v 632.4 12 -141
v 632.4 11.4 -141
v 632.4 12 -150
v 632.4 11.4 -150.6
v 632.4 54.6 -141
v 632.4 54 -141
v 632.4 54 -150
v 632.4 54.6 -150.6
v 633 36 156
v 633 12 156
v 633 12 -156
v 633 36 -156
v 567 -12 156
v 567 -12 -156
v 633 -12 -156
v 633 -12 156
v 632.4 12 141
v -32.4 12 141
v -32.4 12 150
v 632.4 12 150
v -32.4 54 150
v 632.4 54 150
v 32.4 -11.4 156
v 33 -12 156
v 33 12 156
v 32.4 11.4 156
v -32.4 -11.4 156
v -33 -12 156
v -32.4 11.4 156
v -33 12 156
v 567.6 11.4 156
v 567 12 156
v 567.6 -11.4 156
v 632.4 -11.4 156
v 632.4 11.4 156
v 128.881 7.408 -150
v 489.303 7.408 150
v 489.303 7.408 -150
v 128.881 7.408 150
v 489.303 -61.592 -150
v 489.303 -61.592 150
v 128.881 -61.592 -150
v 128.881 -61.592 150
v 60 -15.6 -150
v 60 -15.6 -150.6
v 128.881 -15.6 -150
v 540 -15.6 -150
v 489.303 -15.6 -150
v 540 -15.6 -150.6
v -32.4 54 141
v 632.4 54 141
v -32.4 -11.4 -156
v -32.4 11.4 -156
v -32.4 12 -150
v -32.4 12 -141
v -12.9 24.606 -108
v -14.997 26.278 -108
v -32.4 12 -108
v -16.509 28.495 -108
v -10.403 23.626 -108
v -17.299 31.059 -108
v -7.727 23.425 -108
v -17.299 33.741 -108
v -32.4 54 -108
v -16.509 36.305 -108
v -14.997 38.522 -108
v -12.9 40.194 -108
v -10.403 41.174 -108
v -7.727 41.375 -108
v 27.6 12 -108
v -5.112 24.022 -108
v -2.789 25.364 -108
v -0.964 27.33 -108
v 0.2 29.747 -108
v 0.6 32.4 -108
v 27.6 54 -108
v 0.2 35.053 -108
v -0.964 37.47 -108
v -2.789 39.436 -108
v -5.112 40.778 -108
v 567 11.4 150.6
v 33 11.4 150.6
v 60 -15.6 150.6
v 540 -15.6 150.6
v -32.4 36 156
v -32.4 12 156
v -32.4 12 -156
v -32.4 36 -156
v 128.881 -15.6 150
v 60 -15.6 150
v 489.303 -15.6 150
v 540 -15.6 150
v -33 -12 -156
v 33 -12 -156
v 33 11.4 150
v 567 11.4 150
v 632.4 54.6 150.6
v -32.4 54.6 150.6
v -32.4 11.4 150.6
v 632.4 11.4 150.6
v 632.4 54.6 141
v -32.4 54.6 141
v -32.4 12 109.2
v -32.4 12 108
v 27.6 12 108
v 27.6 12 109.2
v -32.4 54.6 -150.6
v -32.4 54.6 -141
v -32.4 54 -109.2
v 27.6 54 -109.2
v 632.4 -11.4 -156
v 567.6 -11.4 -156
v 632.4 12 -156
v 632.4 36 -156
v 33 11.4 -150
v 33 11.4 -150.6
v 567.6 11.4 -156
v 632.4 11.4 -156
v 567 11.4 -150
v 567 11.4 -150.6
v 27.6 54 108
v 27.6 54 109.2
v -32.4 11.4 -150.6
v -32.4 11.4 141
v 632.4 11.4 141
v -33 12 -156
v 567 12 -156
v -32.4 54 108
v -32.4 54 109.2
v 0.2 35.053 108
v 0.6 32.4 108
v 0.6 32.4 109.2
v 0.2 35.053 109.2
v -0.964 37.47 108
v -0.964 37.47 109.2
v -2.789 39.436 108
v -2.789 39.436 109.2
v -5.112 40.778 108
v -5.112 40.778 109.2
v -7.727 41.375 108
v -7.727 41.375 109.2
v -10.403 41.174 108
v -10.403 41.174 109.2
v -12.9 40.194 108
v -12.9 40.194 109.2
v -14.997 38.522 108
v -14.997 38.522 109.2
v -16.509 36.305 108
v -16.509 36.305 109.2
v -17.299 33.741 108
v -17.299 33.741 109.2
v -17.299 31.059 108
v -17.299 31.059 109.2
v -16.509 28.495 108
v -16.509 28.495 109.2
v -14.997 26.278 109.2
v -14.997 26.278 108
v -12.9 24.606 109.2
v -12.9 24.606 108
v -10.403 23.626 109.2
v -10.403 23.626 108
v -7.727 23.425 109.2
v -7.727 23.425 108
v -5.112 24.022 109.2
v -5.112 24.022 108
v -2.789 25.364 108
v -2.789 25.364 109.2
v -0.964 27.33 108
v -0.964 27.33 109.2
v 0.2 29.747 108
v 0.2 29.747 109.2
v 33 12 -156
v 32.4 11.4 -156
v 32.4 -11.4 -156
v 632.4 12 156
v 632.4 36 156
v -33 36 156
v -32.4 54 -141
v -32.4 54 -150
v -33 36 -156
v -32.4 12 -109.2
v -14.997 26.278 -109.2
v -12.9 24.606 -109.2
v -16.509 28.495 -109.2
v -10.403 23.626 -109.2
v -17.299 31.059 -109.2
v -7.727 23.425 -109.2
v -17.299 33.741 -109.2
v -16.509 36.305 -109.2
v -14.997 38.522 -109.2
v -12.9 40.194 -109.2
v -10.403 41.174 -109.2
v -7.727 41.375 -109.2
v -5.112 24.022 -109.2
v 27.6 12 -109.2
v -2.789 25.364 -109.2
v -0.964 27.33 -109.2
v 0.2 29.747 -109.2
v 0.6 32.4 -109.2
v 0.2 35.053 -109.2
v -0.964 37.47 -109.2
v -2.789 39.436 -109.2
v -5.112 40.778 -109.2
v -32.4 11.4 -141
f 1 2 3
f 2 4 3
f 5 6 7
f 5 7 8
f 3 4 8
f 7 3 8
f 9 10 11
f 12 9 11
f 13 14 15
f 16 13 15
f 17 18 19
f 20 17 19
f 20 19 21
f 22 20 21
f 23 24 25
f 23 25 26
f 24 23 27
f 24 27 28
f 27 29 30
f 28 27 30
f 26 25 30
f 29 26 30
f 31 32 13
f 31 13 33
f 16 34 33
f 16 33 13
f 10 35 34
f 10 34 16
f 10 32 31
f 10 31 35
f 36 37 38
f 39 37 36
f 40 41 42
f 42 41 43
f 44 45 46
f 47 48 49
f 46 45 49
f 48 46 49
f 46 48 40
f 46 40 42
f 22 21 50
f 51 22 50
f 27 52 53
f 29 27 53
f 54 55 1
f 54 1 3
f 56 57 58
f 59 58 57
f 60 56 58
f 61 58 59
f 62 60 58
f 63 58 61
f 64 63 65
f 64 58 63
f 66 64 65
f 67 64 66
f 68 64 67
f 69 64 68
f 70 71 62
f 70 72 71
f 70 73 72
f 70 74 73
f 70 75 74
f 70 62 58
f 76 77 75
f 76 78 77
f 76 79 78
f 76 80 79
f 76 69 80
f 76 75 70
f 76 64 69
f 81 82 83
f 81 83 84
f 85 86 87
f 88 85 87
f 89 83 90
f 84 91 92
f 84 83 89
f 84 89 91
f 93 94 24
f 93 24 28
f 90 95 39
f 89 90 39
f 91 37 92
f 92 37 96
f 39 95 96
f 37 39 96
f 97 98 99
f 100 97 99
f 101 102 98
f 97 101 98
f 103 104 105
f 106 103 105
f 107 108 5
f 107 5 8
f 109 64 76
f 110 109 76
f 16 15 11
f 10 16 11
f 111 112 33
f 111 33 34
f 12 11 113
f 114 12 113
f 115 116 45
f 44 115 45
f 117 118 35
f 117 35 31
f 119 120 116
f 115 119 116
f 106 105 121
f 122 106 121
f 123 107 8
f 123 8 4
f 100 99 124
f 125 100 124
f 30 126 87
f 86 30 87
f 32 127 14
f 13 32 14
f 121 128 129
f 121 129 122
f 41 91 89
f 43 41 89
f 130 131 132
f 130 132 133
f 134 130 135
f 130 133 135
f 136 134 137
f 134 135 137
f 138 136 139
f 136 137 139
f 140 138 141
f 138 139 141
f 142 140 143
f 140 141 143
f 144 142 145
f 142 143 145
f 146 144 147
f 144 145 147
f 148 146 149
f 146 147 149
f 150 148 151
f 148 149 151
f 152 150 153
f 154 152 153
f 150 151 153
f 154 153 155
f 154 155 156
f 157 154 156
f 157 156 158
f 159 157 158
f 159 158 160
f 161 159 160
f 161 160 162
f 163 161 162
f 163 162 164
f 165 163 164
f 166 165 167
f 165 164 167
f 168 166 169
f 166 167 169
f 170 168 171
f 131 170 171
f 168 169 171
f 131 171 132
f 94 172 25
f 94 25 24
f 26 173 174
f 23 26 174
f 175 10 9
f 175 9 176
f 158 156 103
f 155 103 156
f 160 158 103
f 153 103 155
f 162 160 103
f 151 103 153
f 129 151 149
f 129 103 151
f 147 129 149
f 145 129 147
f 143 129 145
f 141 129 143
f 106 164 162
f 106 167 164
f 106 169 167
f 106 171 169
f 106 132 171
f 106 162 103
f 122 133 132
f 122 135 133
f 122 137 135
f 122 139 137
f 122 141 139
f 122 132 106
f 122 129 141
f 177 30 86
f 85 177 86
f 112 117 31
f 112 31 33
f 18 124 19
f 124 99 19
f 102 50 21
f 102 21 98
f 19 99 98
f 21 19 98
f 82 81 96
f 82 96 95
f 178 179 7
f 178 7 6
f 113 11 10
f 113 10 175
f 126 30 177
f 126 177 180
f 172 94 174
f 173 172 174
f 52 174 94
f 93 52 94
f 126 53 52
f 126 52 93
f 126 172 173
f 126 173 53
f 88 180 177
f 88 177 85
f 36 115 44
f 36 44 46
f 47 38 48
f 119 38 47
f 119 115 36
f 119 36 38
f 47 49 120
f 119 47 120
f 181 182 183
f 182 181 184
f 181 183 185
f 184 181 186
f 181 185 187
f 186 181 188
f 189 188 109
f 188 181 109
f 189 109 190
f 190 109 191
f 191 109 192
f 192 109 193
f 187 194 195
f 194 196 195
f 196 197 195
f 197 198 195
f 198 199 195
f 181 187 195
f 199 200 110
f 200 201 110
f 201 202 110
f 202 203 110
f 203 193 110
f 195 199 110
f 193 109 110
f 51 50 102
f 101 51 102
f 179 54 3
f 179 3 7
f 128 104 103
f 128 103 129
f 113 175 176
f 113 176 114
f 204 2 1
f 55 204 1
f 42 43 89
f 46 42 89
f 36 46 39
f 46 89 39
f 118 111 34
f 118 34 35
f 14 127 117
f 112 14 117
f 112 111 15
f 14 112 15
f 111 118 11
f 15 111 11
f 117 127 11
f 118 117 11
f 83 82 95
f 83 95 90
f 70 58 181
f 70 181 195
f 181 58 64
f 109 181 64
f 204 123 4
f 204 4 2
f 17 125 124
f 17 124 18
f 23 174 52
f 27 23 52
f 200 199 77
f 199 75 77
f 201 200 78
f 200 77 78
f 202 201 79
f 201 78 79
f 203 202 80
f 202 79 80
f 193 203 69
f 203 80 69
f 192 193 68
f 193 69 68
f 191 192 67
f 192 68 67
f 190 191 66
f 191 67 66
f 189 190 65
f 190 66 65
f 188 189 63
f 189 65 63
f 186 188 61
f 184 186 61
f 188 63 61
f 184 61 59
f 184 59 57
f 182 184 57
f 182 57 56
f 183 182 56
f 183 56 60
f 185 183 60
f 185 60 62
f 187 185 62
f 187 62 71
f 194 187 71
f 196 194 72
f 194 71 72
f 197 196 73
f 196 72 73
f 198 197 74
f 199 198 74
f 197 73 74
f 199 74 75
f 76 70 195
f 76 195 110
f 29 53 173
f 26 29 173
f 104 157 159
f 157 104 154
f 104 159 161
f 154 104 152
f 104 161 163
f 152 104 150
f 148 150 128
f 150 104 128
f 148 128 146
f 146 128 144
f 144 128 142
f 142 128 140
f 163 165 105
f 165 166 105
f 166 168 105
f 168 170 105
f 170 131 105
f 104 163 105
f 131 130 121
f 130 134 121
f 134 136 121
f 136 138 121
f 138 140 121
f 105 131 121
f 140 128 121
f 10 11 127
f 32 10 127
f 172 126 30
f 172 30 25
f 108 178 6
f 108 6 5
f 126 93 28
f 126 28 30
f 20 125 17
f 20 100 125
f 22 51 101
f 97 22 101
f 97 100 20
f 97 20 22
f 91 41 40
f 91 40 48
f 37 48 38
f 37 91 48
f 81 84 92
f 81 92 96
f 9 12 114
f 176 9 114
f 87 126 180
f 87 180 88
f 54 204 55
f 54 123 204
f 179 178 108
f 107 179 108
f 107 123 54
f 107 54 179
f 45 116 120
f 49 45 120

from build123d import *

# Parameters (mm, degrees)
SHEET_EXTRUDE_1_1_BACK  = 260
SHEET_EXTRUDE_1_1_DEPTH = 520
THICKEN_1_T2            = 1
THICKEN_START           = 20
THICKEN_2_OUTLINE_W     = 1
THICKEN_2_OUTLINE_H     = 520
THICKEN_2_DEPTH         = 40
THICKEN_START_2         = -54
THICKEN_3_DEPTH         = 1108
EXTRUDE_1_DEPTH         = 1
SKETCH_5_W              = 100
SKETCH_5_H              = 70
EXTRUDE_2_DEPTH         = 2
SKETCH_6_R              = 15
CUT_EXTRUDE_1_DEPTH     = 200
SKETCH_7_W              = 600.703712977
SKETCH_7_H              = 115
EXTRUDE_3_DEPTH         = 500
SCALE_1_SCALE           = 0.6


# Read off the part's stored shape, not the designer's step: 加厚2, 加厚3
with BuildPart() as body_1:
    # Sheet 凸台-拉伸1: a surface, the sketch's curves swept straight by 520 mm
    with BuildLine(Plane.XY.offset(-SHEET_EXTRUDE_1_1_BACK), mode=Mode.PRIVATE) as sheet_extrude_1_1_path:
        Line((-55, 20), (55, 20))
        Line((55, 20), (55, -20))
        Line((55, -20), (-55, -20))
        Line((-55, -20), (-55, 20))
    sheet_extrude_1_1 = Shell.extrude(sheet_extrude_1_1_path.wire(), (0 * SHEET_EXTRUDE_1_1_DEPTH, 0 * SHEET_EXTRUDE_1_1_DEPTH, 1 * SHEET_EXTRUDE_1_1_DEPTH))
    add(Solid.thicken(sheet_extrude_1_1, -THICKEN_1_T2))


with BuildPart() as body_2:
    # 加厚2 outline → 加厚2 (new body)
    with BuildSketch(Plane(origin=(0, 0, 0), x_dir=(1, 0, 0), z_dir=(0, 1, 0)).offset(THICKEN_START)):
        with Locations((-54.5, 0)):
            Rectangle(THICKEN_2_OUTLINE_W, THICKEN_2_OUTLINE_H)
    extrude(amount=THICKEN_2_DEPTH)


with BuildPart() as body_3:
    # 镜向2: mirrored copy
    add(body_1.part.mirror(Plane(origin=(500, 0, 0), x_dir=(0, 0, 1), z_dir=(1, 0, 0))))


with BuildPart() as body_4:
    # Mirror 2 2: mirrored copy
    add(body_2.part.mirror(Plane(origin=(500, 0, 0), x_dir=(0, 0, 1), z_dir=(1, 0, 0))))


with BuildPart() as body_5:
    # 加厚3 outline → 加厚3 (new body)
    with BuildSketch(Plane.YZ.offset(THICKEN_START_2)):
        Polygon((19, 235), (20, 235), (20, 250), (90, 250), (90, 235), (91, 235), (91, 251), (19, 251), align=None)
    extrude(amount=THICKEN_3_DEPTH)


with BuildPart() as body_6:
    # 镜向3: mirrored copy
    add(body_5.part.mirror(Plane.XY))


with BuildPart() as body_7:
    # 草图4 → 凸台-拉伸1 (new body)
    with BuildSketch(Plane.XY.offset(251)):
        Polygon((55, 19), (100, -26), (900, -26), (945, 19), align=None)
    extrude(amount=-EXTRUDE_1_DEPTH)


with BuildPart() as body_8:
    # 镜向4: mirrored copy
    add(body_7.part.mirror(Plane.XY))


with BuildPart() as body_9:
    # 草图5 → 凸台-拉伸2 (new body)
    with BuildSketch(Plane.XY.offset(180)):
        with Locations((-4, 55)):
            Rectangle(SKETCH_5_W, SKETCH_5_H)
    extrude(amount=EXTRUDE_2_DEPTH)


with BuildPart() as body_10:
    # 镜向5: mirrored copy
    add(body_9.part.mirror(Plane.XY))


with BuildPart() as cut_extrude_1_tool:
    # 草图6 → 切除-拉伸1 (new, symmetric)
    with BuildSketch(Plane.XY):
        with Locations((-14, 54)):
            Circle(SKETCH_6_R)
    extrude(amount=CUT_EXTRUDE_1_DEPTH, both=True)


with BuildPart() as body_9_1:
    add(body_9.part)

    # 切除-拉伸1: cut by cut_extrude_1_tool
    add(cut_extrude_1_tool.part, mode=Mode.SUBTRACT)


with BuildPart() as body_10_1:
    add(body_10.part)

    # 切除-拉伸1: cut by cut_extrude_1_tool
    add(cut_extrude_1_tool.part, mode=Mode.SUBTRACT)


with BuildPart() as body_7_1:
    add(body_7.part)

    add(body_8.part)  # 凸台-拉伸3 merges body 8
    # 草图7 → 凸台-拉伸3 (add)
    with BuildSketch(Plane(origin=(0, 0, 250), x_dir=(-1, 0, 0), z_dir=(0, 0, -1))):
        with Locations((-515.152886454, -45.152554207)):
            Rectangle(SKETCH_7_W, SKETCH_7_H)
    extrude(amount=EXTRUDE_3_DEPTH)


with BuildPart() as body_1_1:
    # 缩放比例1: scaled about (0, 0, 0)
    add(body_1.part.scale(SCALE_1_SCALE))


with BuildPart() as body_7_2:
    # 缩放比例1: scaled about (0, 0, 0)
    add(body_7_1.part.scale(SCALE_1_SCALE))


with BuildPart() as body_4_1:
    # 缩放比例1: scaled about (0, 0, 0)
    add(body_4.part.scale(SCALE_1_SCALE))


with BuildPart() as body_5_1:
    # 缩放比例1: scaled about (0, 0, 0)
    add(body_5.part.scale(SCALE_1_SCALE))


with BuildPart() as body_9_2:
    # 缩放比例1: scaled about (0, 0, 0)
    add(body_9_1.part.scale(SCALE_1_SCALE))


with BuildPart() as body_6_1:
    # 缩放比例1: scaled about (0, 0, 0)
    add(body_6.part.scale(SCALE_1_SCALE))


with BuildPart() as body_3_1:
    # 缩放比例1: scaled about (0, 0, 0)
    add(body_3.part.scale(SCALE_1_SCALE))


with BuildPart() as body_10_2:
    # 缩放比例1: scaled about (0, 0, 0)
    add(body_10_1.part.scale(SCALE_1_SCALE))


with BuildPart() as body_2_1:
    # 缩放比例1: scaled about (0, 0, 0)
    add(body_2.part.scale(SCALE_1_SCALE))


solid = Compound([body_1_1.part, body_7_2.part, body_4_1.part, body_5_1.part, body_9_2.part, body_6_1.part, body_3_1.part, body_10_2.part, body_2_1.part])
